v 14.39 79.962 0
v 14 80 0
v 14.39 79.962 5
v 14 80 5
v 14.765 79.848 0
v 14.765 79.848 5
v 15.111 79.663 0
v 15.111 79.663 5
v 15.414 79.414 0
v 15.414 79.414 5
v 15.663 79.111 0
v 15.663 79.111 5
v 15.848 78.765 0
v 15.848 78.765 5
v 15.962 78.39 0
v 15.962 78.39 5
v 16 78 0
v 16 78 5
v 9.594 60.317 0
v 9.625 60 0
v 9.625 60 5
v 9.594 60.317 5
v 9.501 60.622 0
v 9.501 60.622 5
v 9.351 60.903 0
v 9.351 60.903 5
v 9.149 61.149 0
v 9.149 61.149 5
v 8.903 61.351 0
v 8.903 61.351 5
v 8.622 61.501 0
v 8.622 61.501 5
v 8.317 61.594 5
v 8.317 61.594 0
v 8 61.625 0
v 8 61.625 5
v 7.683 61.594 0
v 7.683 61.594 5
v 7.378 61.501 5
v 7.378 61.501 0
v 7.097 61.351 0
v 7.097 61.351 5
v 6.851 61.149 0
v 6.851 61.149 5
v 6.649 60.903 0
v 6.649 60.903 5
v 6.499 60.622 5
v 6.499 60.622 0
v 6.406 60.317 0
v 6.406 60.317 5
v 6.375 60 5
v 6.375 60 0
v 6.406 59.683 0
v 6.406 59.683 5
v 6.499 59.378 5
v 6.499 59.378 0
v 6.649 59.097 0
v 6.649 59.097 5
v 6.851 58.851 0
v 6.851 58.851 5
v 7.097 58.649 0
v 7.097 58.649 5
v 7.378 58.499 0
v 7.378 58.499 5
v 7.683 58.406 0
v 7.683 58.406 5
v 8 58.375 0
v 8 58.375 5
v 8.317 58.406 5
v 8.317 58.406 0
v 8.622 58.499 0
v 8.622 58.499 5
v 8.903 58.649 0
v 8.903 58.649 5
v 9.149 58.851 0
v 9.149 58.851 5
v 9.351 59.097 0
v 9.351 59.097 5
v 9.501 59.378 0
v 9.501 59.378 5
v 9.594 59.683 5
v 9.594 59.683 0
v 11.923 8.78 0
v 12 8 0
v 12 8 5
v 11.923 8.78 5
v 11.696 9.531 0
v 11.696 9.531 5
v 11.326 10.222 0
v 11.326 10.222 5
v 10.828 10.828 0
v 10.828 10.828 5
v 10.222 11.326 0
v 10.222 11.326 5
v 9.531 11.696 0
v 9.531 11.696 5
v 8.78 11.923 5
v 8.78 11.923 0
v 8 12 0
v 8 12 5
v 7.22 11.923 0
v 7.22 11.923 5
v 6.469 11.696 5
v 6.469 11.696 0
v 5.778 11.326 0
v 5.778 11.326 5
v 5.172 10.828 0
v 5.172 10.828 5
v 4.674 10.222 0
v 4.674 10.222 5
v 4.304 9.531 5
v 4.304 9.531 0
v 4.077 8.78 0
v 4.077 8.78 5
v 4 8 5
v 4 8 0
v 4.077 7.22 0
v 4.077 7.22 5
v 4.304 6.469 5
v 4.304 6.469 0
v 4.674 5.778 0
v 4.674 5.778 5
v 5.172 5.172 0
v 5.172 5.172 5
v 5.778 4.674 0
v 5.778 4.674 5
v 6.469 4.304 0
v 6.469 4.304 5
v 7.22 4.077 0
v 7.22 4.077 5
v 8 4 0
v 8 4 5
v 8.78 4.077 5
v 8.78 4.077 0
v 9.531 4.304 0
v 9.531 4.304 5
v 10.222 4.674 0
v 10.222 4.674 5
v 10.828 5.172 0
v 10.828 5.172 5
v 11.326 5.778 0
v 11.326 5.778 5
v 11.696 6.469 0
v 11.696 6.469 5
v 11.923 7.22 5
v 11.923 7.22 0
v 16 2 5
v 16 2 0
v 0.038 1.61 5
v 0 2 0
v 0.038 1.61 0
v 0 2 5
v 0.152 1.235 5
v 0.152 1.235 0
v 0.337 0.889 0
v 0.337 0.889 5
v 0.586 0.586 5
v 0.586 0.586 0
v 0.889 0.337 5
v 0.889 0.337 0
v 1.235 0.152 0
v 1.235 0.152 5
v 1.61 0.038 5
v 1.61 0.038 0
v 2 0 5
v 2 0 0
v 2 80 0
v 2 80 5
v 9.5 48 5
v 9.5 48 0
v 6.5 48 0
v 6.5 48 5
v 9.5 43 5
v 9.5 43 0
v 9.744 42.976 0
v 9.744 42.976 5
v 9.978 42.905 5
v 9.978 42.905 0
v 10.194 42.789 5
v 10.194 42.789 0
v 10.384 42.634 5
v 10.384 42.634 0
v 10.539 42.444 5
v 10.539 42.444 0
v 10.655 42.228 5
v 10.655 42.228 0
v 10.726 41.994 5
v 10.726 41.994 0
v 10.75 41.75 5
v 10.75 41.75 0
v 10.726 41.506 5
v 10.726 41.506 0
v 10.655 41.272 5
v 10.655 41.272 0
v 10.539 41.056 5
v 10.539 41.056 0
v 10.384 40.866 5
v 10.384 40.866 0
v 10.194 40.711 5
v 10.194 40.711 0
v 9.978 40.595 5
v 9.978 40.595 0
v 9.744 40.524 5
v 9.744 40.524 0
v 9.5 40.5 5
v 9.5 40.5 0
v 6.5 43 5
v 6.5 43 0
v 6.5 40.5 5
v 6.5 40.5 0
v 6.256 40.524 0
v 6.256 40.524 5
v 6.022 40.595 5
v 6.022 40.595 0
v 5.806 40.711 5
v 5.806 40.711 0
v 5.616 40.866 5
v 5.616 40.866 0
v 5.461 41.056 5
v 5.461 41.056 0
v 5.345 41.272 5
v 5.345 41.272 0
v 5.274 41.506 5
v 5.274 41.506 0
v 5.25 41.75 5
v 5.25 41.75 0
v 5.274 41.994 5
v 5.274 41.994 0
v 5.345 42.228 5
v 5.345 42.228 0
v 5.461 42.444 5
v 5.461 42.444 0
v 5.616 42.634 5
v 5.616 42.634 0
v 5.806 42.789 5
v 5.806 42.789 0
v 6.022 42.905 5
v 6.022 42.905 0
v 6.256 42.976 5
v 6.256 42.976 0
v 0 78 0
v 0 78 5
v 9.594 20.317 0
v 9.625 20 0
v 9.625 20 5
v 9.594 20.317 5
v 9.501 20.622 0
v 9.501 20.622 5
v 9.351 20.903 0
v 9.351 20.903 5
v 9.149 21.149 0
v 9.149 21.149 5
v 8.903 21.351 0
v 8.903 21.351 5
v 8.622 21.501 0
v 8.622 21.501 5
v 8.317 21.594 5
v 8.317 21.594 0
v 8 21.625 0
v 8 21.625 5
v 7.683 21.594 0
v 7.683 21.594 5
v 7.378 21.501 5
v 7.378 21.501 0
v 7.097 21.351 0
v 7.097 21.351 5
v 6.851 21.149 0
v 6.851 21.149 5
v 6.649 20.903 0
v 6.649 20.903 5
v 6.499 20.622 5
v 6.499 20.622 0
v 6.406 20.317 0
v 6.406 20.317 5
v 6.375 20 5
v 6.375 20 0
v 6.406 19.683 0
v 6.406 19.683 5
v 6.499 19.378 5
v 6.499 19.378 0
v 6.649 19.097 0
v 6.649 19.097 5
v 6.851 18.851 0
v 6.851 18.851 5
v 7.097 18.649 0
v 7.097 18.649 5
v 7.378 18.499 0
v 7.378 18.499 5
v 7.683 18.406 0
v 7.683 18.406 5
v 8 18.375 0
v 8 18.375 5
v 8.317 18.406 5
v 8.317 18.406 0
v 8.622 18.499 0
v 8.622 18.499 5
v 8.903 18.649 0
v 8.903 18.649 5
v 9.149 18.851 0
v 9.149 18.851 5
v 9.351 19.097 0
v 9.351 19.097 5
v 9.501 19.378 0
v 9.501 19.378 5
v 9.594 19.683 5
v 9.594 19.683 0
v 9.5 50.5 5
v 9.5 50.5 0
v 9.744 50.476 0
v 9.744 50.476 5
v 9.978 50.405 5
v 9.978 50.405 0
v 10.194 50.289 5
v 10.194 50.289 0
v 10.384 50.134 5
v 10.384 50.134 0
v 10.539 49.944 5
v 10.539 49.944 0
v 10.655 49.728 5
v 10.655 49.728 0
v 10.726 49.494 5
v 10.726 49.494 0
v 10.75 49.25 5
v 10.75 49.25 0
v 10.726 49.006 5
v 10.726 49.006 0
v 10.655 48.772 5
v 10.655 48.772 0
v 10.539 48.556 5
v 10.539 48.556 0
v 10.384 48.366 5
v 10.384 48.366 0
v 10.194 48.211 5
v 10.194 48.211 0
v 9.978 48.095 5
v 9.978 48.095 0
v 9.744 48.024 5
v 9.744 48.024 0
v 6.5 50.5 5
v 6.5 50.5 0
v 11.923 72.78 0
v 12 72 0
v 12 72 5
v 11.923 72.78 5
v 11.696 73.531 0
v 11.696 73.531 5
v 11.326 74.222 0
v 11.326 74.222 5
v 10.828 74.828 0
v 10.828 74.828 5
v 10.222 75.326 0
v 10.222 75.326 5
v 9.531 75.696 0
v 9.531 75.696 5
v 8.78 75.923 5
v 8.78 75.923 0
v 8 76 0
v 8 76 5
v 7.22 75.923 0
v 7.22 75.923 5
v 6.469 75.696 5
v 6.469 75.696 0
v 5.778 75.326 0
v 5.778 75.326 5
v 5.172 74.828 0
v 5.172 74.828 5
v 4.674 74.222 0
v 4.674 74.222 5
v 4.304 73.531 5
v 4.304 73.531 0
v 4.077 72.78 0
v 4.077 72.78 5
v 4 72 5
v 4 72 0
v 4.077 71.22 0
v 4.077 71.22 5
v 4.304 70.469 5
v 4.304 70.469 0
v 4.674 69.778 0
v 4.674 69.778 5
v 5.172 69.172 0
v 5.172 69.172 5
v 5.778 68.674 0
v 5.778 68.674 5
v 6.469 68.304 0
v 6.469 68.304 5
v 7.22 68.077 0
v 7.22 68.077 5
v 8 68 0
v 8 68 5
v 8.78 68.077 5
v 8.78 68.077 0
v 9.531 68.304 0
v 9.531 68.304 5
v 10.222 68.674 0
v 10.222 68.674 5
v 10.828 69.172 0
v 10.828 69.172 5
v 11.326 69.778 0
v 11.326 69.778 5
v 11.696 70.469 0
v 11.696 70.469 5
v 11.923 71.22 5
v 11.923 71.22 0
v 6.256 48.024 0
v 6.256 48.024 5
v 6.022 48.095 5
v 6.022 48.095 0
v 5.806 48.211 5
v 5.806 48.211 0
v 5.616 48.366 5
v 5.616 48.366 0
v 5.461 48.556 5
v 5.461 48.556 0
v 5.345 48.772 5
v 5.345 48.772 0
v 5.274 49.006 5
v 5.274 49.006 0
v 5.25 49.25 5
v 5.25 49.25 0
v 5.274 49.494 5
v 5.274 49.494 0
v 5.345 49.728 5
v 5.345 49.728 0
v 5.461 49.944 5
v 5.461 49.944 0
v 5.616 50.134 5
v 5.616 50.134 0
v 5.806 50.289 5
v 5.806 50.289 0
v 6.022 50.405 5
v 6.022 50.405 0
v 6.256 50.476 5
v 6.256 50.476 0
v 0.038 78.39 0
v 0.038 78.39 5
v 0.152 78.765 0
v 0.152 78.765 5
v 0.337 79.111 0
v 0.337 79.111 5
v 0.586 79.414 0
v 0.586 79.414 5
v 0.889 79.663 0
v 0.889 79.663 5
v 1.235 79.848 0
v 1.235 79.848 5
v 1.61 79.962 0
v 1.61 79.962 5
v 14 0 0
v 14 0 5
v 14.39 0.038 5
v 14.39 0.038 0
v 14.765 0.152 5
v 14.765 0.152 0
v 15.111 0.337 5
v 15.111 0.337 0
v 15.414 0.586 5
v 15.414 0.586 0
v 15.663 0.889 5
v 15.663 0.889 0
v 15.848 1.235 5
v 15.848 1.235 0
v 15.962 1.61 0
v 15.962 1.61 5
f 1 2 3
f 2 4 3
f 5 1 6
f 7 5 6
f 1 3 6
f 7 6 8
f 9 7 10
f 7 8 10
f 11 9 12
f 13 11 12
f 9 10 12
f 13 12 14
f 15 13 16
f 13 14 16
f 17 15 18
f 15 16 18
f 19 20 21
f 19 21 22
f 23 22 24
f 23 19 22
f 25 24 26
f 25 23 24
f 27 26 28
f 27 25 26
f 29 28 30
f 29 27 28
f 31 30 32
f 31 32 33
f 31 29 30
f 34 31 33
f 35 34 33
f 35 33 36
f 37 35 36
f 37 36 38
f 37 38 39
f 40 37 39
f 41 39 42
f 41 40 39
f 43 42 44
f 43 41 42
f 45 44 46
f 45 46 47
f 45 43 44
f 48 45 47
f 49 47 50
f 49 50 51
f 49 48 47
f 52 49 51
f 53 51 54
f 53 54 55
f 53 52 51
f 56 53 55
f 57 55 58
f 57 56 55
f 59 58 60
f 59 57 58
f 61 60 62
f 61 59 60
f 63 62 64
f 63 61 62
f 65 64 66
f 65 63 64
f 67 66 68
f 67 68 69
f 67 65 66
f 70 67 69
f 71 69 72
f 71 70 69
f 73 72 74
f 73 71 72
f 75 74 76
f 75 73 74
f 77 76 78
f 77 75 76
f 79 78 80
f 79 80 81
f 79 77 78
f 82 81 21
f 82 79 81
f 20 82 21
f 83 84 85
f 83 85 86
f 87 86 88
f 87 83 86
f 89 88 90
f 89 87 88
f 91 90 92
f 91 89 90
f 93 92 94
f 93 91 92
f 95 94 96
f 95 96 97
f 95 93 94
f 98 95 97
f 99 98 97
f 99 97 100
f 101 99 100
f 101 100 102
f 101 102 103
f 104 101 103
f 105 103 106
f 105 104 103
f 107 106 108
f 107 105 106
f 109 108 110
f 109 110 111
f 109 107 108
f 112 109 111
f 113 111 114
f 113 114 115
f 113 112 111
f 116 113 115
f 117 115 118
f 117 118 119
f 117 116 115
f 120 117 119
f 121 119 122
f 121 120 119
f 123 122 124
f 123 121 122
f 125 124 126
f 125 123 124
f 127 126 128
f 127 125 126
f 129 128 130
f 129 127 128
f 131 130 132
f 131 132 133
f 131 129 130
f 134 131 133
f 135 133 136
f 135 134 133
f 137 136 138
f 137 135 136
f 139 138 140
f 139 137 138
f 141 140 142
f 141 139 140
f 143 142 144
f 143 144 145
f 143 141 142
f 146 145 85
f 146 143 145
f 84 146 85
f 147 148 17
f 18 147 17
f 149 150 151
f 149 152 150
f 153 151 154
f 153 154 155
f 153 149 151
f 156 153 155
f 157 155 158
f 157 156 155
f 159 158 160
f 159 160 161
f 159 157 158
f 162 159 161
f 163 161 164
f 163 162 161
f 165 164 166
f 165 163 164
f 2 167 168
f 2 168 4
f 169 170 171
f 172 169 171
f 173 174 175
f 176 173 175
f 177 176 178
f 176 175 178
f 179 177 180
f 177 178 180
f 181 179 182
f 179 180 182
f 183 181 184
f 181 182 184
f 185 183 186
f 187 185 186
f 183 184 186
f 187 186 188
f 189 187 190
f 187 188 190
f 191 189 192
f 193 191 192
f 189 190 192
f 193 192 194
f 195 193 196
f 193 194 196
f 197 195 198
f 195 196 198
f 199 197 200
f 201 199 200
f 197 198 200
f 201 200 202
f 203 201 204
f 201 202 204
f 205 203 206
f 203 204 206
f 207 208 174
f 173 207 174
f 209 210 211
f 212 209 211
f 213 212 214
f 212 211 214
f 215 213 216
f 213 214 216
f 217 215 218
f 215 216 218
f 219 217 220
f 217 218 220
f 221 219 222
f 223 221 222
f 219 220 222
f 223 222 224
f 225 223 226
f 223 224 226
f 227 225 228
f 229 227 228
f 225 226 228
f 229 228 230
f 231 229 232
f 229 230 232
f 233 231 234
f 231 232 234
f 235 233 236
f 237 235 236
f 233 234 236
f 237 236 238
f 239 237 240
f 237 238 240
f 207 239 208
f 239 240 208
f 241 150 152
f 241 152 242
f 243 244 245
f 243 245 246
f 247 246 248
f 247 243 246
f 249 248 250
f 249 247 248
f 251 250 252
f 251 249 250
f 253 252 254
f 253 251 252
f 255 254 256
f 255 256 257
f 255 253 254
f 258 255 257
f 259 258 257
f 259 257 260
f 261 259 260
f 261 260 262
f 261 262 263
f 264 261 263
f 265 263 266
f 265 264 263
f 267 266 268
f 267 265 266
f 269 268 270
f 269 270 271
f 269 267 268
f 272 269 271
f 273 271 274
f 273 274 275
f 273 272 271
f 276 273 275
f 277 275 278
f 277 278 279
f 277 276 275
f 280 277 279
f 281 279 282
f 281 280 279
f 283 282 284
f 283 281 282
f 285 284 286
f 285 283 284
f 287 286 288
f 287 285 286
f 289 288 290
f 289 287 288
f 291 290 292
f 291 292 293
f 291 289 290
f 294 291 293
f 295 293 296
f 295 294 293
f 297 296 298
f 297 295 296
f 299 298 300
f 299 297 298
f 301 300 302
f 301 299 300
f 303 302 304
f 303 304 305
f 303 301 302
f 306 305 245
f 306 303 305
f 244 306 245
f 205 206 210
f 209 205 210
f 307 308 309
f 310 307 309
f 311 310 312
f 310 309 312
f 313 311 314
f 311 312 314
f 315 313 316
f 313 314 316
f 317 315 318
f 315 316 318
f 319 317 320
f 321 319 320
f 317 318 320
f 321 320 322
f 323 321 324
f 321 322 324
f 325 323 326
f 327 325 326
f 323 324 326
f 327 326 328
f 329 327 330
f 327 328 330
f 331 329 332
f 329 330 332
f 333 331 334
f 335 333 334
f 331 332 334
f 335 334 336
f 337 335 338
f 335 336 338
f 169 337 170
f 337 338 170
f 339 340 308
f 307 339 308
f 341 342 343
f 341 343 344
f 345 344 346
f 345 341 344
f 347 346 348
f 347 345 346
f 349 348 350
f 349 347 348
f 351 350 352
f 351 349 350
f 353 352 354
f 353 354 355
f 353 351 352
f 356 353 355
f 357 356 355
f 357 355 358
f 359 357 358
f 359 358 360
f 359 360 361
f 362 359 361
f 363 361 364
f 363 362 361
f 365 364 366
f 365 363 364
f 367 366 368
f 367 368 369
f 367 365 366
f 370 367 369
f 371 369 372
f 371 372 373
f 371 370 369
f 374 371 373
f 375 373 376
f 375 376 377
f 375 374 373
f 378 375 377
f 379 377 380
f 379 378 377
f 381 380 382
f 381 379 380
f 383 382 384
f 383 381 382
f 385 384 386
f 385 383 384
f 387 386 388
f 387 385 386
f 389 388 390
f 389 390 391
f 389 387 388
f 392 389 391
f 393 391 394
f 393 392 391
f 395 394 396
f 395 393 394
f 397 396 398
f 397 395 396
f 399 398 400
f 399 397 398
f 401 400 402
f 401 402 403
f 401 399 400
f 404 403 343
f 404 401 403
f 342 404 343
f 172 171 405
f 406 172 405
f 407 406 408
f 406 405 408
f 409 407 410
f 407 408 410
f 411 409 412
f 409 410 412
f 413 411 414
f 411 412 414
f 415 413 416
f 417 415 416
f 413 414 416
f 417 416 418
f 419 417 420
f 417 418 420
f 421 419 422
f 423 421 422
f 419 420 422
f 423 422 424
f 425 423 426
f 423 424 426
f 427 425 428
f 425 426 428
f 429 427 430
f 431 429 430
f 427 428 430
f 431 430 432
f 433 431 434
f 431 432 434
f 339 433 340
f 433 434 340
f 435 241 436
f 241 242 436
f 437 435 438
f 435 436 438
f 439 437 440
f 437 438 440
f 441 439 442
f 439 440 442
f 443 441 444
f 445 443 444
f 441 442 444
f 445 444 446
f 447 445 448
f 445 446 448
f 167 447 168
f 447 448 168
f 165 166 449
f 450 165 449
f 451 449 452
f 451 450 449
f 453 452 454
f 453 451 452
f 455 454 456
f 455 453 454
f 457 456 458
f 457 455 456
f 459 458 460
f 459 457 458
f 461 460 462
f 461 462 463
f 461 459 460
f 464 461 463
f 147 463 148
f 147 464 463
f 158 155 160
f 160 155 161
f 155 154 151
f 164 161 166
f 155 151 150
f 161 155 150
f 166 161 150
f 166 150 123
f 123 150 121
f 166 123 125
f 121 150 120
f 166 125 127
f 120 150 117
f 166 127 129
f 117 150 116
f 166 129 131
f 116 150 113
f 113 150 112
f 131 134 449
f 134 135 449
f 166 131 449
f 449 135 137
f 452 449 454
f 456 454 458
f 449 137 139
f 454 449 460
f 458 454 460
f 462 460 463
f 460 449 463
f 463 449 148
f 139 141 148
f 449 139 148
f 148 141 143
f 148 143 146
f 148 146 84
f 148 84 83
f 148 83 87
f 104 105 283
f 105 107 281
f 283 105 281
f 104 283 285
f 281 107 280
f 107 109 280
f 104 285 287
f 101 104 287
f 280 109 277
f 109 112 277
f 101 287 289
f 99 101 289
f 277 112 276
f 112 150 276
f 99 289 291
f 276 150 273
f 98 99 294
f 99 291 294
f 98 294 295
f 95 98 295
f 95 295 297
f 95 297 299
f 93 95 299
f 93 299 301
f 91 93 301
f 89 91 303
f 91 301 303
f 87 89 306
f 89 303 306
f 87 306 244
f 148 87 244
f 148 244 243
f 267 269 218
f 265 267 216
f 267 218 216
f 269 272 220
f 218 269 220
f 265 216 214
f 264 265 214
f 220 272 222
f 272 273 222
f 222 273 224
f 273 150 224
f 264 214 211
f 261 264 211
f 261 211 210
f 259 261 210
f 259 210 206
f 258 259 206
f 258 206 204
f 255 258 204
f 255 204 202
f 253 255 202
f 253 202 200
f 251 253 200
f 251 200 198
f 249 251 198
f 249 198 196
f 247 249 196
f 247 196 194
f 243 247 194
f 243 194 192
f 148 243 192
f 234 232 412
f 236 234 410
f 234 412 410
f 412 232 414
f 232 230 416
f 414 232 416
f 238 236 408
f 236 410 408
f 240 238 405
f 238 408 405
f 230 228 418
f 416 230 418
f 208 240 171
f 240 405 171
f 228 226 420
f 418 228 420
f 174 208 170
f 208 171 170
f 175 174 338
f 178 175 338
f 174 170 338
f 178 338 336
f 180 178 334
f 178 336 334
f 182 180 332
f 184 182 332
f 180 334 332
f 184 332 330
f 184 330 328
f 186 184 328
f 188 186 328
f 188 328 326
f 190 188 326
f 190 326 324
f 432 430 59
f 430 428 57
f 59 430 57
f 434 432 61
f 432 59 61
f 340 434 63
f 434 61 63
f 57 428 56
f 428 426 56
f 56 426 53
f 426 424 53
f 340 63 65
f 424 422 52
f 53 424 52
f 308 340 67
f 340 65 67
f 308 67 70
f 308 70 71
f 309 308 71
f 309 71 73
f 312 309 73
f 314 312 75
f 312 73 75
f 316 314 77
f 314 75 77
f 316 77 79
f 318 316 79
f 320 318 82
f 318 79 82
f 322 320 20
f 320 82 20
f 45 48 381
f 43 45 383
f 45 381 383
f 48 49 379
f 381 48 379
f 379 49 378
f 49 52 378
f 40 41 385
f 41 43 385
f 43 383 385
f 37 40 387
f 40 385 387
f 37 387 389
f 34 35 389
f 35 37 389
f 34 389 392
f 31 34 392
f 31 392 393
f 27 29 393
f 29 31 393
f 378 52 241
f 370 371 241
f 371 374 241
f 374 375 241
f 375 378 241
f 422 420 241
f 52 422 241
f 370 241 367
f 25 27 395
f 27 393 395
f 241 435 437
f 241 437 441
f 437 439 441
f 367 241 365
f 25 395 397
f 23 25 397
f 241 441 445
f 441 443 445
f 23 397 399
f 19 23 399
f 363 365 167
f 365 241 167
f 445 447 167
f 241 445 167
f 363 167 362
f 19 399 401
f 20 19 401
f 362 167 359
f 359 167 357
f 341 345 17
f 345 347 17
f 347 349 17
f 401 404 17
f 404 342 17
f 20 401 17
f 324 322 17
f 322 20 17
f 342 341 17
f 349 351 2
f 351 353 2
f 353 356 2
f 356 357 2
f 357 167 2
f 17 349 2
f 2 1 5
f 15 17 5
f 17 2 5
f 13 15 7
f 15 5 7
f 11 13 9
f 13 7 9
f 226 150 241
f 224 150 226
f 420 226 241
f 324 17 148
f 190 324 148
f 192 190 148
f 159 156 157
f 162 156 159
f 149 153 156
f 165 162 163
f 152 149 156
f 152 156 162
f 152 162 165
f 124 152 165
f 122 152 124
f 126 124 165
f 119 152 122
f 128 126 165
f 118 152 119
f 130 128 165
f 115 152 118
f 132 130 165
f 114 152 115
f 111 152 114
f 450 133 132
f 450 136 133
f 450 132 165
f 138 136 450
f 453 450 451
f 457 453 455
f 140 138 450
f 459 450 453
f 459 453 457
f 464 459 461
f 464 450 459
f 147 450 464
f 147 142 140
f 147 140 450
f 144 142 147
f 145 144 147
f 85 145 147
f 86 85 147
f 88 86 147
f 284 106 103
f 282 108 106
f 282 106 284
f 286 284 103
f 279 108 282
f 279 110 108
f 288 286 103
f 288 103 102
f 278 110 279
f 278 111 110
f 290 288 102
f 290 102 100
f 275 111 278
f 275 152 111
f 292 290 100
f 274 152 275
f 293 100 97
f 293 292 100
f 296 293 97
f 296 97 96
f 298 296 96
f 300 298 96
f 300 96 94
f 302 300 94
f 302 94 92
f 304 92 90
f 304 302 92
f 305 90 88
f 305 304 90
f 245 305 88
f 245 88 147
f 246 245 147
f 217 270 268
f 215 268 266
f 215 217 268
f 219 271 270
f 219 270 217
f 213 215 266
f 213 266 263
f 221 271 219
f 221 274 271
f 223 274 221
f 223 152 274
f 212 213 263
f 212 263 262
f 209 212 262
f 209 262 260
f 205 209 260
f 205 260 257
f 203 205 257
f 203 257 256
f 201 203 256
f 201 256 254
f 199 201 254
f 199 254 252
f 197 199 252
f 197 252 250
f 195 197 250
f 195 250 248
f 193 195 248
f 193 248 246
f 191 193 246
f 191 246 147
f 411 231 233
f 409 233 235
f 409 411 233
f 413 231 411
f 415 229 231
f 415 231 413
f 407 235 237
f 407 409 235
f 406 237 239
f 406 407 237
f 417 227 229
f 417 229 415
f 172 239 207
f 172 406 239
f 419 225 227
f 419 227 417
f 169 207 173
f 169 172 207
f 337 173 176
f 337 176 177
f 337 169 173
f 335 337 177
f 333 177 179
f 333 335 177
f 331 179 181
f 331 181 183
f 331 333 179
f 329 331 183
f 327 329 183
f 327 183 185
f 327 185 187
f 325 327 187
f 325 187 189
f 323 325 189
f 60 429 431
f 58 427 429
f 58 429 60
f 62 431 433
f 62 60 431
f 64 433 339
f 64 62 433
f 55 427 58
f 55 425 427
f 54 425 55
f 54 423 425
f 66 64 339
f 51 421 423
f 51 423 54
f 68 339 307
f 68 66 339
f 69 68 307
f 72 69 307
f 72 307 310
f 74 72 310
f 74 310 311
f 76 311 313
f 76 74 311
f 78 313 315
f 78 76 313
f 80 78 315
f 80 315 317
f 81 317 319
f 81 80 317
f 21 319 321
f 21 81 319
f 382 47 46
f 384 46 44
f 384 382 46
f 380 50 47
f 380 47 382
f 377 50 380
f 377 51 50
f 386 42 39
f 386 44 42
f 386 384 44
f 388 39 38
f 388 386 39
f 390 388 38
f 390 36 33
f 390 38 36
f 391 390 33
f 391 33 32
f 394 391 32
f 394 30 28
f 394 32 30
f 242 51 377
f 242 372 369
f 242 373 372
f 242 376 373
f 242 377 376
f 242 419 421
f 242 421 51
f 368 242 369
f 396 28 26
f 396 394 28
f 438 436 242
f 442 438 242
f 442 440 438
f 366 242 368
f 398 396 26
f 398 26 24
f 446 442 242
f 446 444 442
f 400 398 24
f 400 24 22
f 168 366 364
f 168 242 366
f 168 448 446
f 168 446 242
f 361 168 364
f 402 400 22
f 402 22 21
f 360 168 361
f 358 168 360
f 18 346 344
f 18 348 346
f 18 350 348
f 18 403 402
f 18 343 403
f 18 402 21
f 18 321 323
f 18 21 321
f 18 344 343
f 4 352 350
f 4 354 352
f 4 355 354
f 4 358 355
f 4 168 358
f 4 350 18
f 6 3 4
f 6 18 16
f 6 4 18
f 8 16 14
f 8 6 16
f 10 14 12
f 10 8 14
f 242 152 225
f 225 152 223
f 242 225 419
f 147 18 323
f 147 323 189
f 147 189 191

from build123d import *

# Parameters (mm, degrees)
SKETCH1_W           = 16
SKETCH1_H           = 80
SKETCH1_R           = 4
SKETCH1_R_2         = 1.625
BOSS_EXTRUDE1_DEPTH = 5
FILLET1_R           = 2


with BuildPart() as part:
    # Sketch1 → Boss-Extrude1 (new body)
    with BuildSketch(Plane.XY):
        with Locations((8, 40)):
            Rectangle(SKETCH1_W, SKETCH1_H)
        with Locations((8, 72)):
            Circle(SKETCH1_R, mode=Mode.SUBTRACT)
        with Locations((8, 8)):
            Circle(SKETCH1_R, mode=Mode.SUBTRACT)
        with Locations((8, 20)):
            Circle(SKETCH1_R_2, mode=Mode.SUBTRACT)
        with Locations((8, 60)):
            Circle(SKETCH1_R_2, mode=Mode.SUBTRACT)
        with BuildLine():
            Line((6.5, 50.5), (9.5, 50.5))
            ThreePointArc((9.5, 50.5), (10.75, 49.25), (9.5, 48))
            Line((9.5, 48), (6.5, 48))
            ThreePointArc((6.5, 48), (5.25, 49.25), (6.5, 50.5))
        make_face(mode=Mode.SUBTRACT)
        with BuildLine():
            Line((6.5, 43), (9.5, 43))
            ThreePointArc((9.5, 43), (10.75, 41.75), (9.5, 40.5))
            Line((9.5, 40.5), (6.5, 40.5))
            ThreePointArc((6.5, 40.5), (5.25, 41.75), (6.5, 43))
        make_face(mode=Mode.SUBTRACT)
    extrude(amount=BOSS_EXTRUDE1_DEPTH)

    # Fillet1
    fillet1_edges = [part.edges().sort_by_distance(p)[0] for p in [
        (0, 80, 2.5),
        (16, 80, 2.5),
        (16, 0, 2.5),
        (0, 0, 2.5),
    ]]
    fillet(fillet1_edges, radius=FILLET1_R)


solid = part.part
